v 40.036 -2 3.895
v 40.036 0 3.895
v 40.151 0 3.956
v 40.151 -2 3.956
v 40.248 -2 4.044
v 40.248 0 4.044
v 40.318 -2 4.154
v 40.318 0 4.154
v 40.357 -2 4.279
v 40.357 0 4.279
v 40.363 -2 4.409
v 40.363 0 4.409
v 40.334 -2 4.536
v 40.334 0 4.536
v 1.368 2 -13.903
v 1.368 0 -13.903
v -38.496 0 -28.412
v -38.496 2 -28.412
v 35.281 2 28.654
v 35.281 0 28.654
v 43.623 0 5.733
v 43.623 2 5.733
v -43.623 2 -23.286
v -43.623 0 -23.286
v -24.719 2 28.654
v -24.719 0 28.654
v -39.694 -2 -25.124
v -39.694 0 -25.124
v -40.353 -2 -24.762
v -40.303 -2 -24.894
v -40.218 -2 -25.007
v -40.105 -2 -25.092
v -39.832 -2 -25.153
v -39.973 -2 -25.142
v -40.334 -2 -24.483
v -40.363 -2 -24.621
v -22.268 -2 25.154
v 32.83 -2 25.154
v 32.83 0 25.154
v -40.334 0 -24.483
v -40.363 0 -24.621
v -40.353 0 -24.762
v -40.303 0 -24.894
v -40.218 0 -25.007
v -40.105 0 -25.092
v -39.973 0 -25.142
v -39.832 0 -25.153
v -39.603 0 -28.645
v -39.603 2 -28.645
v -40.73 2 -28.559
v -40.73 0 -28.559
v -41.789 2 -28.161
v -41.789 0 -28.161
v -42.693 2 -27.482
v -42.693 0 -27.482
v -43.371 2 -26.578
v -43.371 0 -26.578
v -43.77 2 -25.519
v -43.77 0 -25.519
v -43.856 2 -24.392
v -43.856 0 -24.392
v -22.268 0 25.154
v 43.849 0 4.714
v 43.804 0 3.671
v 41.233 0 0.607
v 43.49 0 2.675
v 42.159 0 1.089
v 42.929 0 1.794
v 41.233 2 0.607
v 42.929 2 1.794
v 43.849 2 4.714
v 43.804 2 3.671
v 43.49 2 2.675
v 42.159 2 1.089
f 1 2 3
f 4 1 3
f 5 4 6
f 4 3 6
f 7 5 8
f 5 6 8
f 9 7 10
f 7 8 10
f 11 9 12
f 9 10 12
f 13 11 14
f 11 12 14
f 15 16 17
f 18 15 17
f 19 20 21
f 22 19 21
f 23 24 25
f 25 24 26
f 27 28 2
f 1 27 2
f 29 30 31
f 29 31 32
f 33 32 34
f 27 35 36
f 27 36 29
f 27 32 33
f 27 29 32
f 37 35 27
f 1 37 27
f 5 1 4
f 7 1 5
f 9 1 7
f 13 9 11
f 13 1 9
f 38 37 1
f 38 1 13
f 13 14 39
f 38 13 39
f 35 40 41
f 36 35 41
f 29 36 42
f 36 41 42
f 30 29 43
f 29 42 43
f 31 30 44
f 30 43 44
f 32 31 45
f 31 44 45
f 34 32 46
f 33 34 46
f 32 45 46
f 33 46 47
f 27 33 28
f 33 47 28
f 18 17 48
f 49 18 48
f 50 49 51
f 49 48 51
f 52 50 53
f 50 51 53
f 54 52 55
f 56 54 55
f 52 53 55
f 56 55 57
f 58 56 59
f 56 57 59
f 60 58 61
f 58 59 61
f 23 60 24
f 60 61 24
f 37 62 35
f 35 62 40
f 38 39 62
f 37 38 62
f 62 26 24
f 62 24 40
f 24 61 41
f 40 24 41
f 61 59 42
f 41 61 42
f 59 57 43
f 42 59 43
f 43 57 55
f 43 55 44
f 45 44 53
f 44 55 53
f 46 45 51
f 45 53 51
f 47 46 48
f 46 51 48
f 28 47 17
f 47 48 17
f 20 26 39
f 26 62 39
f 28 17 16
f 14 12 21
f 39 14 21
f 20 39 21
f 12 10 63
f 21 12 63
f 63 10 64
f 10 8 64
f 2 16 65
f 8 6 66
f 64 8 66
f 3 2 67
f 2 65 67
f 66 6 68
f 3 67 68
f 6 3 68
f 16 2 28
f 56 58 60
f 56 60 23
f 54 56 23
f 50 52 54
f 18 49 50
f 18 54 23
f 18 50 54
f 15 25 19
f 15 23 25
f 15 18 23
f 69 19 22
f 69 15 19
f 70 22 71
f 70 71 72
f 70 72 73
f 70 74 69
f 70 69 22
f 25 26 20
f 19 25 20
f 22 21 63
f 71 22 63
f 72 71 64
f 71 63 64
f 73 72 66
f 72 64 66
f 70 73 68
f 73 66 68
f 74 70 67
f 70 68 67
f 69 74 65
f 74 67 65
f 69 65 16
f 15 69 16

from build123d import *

# Parameters (mm, degrees)
BOSS_EXTRUDE1_DEPTH = 2
BOSS_EXTRUDE2_DEPTH = 2


with BuildPart() as part:
    # Sketch1 → Boss-Extrude1 (new body)
    with BuildSketch(Plane(origin=(0, 0, 0), x_dir=(1, 0, 0), z_dir=(0, 1, 0))):
        with BuildLine():
            Line((-24.718969723, -28.65368563), (35.281030277, -28.65368563))
            Line((35.281030277, -28.65368563), (43.623325522, -5.733417816))
            ThreePointArc((43.623325522, -5.733417816), (43.489786187, -2.674864196), (41.232635612, -0.60656676))
            Line((41.232635612, -0.60656676), (1.368080573, 13.902944676))
            Line((1.368080573, 13.902944676), (-38.496474466, 28.412456113))
            ThreePointArc((-38.496474466, 28.412456113), (-42.692982164, 27.482112755), (-43.623325522, 23.285605056))
            Line((-43.623325522, 23.285605056), (-24.718969723, -28.65368563))
        make_face()
    extrude(amount=BOSS_EXTRUDE1_DEPTH)

    # Sketch3 → Boss-Extrude2 (add)
    with BuildSketch(Plane.XZ):
        with BuildLine():
            Line((-22.26824334, 25.15368563), (-40.334401349, -24.482675558))
            ThreePointArc((-40.334401349, -24.482675558), (-40.21810843, -25.00723902), (-39.693544967, -25.12353194))
            Line((-39.693544967, -25.12353194), (40.035565111, 3.895490933))
            ThreePointArc((40.035565111, 3.895490933), (40.317708932, 4.154028112), (40.334401349, 4.536347315))
            Line((40.334401349, 4.536347315), (32.830303893, 25.15368563))
            Line((32.830303893, 25.15368563), (-22.26824334, 25.15368563))
        make_face()
    extrude(amount=BOSS_EXTRUDE2_DEPTH)


solid = part.part
